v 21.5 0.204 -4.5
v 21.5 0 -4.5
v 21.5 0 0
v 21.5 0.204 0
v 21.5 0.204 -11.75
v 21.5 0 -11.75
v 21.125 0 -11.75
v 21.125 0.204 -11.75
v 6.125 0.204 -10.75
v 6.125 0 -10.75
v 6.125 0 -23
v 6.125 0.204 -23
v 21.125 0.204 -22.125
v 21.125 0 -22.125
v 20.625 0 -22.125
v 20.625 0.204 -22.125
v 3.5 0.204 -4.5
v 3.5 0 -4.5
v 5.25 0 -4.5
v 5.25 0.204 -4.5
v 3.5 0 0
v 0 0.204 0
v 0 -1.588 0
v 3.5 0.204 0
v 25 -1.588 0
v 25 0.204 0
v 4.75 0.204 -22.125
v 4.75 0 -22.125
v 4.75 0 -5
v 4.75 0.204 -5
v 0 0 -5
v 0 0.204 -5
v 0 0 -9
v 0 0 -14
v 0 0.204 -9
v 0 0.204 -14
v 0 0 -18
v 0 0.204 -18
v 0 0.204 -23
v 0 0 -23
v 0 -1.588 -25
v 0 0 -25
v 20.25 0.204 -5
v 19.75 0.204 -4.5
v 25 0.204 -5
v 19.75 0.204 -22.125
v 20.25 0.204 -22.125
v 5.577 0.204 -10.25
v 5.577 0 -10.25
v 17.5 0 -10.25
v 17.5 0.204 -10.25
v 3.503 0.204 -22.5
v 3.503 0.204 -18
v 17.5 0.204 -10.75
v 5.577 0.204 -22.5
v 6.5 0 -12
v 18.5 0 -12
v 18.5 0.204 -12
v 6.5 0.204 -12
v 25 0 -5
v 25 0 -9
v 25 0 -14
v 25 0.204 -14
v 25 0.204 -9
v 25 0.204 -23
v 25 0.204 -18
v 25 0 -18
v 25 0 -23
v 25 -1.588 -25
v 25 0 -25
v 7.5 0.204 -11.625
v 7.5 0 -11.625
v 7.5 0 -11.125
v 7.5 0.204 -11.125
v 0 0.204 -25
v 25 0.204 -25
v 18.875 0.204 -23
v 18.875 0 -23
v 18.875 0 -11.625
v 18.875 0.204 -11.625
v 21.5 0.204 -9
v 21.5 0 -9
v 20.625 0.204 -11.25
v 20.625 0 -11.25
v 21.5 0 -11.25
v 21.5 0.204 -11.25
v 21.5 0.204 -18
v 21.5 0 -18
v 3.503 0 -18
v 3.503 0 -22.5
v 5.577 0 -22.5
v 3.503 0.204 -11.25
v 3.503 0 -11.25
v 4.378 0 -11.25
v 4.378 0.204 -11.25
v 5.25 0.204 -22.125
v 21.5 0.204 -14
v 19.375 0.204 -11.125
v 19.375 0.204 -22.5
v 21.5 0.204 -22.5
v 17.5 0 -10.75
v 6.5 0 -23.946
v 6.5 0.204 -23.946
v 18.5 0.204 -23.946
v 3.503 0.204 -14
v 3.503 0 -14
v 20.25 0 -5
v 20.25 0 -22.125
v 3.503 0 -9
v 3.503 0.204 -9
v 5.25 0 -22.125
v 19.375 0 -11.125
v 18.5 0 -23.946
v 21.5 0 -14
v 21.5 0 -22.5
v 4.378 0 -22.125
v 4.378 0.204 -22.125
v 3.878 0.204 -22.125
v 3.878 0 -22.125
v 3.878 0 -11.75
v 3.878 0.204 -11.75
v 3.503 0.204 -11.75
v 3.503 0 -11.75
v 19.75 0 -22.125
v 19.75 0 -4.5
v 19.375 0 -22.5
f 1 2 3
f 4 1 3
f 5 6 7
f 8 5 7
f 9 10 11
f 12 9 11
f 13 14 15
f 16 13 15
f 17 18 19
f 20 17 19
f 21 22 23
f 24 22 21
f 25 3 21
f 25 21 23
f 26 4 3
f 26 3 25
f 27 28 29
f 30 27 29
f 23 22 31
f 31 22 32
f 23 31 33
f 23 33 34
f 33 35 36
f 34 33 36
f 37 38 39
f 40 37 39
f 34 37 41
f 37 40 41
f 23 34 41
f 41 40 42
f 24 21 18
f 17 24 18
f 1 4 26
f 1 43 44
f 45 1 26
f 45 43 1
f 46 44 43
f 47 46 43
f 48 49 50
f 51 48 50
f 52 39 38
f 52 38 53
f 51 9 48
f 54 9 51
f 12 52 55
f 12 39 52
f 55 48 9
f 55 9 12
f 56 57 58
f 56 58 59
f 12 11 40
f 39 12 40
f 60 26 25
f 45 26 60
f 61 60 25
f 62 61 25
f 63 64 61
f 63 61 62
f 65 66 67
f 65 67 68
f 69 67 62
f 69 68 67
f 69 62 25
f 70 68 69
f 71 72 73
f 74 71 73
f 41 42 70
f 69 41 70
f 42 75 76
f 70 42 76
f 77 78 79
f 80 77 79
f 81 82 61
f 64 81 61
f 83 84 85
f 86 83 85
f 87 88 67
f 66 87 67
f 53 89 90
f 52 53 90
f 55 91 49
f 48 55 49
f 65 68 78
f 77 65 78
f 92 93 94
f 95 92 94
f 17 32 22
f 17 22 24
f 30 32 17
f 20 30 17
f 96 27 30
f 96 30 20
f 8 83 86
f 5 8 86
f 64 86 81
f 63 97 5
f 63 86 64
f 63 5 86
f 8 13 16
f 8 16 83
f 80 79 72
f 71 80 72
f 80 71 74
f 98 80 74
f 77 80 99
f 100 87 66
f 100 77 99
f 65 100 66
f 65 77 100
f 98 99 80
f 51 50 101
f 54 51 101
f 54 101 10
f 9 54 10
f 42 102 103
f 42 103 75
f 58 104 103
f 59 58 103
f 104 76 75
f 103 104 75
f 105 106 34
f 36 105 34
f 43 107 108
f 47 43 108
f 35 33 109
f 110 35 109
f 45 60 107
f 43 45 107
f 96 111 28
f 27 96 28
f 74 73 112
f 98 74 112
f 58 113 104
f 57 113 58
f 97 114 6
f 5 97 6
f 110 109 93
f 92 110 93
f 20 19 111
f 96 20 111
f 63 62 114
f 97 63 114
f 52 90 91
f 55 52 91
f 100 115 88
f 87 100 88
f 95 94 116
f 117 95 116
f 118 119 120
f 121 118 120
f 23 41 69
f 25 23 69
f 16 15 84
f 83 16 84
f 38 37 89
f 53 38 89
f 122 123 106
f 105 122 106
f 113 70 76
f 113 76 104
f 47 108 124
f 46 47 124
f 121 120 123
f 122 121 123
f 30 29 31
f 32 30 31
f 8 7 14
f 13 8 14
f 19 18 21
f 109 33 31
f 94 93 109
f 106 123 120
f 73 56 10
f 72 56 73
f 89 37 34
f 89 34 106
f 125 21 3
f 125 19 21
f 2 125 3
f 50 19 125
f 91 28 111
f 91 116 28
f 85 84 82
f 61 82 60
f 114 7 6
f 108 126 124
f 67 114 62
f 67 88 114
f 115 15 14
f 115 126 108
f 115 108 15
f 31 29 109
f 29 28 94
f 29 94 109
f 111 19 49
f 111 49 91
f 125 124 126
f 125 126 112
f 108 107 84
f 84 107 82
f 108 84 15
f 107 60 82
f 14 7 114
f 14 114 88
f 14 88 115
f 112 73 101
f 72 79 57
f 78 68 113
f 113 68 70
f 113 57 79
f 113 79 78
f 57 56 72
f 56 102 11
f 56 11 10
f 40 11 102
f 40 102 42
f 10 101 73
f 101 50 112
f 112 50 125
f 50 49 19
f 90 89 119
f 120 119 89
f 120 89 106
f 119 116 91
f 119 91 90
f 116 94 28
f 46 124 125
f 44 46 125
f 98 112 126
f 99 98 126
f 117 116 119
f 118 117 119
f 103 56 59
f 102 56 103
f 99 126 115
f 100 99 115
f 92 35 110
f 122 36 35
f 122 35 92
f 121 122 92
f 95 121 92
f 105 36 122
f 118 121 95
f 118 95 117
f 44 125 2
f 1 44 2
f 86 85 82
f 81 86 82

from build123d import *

# Parameters (mm, degrees)
SKETCH1_W           = 10
SKETCH1_H           = 10
BOSS_EXTRUDE2_DEPTH = 0.204346
SKETCH3_W           = 25
SKETCH3_H           = 25
BOSS_EXTRUDE3_DEPTH = 1.5875


with BuildPart() as part:
    # Sketch1 → Boss-Extrude2 (new body)
    with BuildSketch(Plane(origin=(0, 0, 0), x_dir=(1, 0, 0), z_dir=(0, 1, 0))):
        Polygon((3.5, 5), (0, 5), (0, 0), (3.5, 0), (3.5, 4.5), (5.25, 4.5), (5.25, 22.125), (4.75, 22.125), (4.75, 5), align=None)
        Polygon((3.503473693, 14), (0, 14), (0, 9), (3.503473693, 9), (3.503473693, 11.25), (4.378473693, 11.25), (4.378473693, 22.125), (3.878473693, 22.125), (3.878473693, 11.75), (3.503473693, 11.75), align=None)
        Polygon((3.503473693, 23), (0, 23), (0, 18), (3.503473693, 18), (3.503473693, 22.5), (5.576932067, 22.5), (5.576932067, 10.25), (17.5, 10.25), (17.5, 10.75), (6.125, 10.75), (6.125, 23), align=None)
        Polygon((18.5, 23.946155101), (18.5, 12), (6.5, 12), (6.5, 23.946155101), (0, 25), (25, 25), align=None)
        with Locations((12.5, 18)):
            Rectangle(SKETCH1_W, SKETCH1_H, mode=Mode.SUBTRACT)
        with Locations((12.5, 18)):
            Rectangle(SKETCH1_W, SKETCH1_H)
        Polygon((25, 18), (25, 23), (21.5, 23), (18.875, 23), (18.875, 11.625), (7.5, 11.625), (7.5, 11.125), (19.375, 11.125), (19.375, 22.5), (21.5, 22.5), (21.5, 18), align=None)
        Polygon((25, 9), (25, 14), (21.5, 14), (21.5, 11.75), (21.125, 11.75), (21.125, 22.125), (20.625, 22.125), (20.625, 11.25), (21.5, 11.25), (21.5, 9), align=None)
        Polygon((25, 0), (25, 5), (21.5, 5), (20.25, 5), (20.25, 22.125), (19.75, 22.125), (19.75, 4.5), (21.5, 4.5), (21.5, 0), align=None)
    extrude(amount=BOSS_EXTRUDE2_DEPTH)

    # Sketch3 → Boss-Extrude3 (add)
    with BuildSketch(Plane(origin=(0, 0, 0), x_dir=(1, 0, 0), z_dir=(0, 1, 0))):
        with Locations((12.5, 12.5)):
            Rectangle(SKETCH3_W, SKETCH3_H)
    extrude(amount=-BOSS_EXTRUDE3_DEPTH)


solid = part.part
